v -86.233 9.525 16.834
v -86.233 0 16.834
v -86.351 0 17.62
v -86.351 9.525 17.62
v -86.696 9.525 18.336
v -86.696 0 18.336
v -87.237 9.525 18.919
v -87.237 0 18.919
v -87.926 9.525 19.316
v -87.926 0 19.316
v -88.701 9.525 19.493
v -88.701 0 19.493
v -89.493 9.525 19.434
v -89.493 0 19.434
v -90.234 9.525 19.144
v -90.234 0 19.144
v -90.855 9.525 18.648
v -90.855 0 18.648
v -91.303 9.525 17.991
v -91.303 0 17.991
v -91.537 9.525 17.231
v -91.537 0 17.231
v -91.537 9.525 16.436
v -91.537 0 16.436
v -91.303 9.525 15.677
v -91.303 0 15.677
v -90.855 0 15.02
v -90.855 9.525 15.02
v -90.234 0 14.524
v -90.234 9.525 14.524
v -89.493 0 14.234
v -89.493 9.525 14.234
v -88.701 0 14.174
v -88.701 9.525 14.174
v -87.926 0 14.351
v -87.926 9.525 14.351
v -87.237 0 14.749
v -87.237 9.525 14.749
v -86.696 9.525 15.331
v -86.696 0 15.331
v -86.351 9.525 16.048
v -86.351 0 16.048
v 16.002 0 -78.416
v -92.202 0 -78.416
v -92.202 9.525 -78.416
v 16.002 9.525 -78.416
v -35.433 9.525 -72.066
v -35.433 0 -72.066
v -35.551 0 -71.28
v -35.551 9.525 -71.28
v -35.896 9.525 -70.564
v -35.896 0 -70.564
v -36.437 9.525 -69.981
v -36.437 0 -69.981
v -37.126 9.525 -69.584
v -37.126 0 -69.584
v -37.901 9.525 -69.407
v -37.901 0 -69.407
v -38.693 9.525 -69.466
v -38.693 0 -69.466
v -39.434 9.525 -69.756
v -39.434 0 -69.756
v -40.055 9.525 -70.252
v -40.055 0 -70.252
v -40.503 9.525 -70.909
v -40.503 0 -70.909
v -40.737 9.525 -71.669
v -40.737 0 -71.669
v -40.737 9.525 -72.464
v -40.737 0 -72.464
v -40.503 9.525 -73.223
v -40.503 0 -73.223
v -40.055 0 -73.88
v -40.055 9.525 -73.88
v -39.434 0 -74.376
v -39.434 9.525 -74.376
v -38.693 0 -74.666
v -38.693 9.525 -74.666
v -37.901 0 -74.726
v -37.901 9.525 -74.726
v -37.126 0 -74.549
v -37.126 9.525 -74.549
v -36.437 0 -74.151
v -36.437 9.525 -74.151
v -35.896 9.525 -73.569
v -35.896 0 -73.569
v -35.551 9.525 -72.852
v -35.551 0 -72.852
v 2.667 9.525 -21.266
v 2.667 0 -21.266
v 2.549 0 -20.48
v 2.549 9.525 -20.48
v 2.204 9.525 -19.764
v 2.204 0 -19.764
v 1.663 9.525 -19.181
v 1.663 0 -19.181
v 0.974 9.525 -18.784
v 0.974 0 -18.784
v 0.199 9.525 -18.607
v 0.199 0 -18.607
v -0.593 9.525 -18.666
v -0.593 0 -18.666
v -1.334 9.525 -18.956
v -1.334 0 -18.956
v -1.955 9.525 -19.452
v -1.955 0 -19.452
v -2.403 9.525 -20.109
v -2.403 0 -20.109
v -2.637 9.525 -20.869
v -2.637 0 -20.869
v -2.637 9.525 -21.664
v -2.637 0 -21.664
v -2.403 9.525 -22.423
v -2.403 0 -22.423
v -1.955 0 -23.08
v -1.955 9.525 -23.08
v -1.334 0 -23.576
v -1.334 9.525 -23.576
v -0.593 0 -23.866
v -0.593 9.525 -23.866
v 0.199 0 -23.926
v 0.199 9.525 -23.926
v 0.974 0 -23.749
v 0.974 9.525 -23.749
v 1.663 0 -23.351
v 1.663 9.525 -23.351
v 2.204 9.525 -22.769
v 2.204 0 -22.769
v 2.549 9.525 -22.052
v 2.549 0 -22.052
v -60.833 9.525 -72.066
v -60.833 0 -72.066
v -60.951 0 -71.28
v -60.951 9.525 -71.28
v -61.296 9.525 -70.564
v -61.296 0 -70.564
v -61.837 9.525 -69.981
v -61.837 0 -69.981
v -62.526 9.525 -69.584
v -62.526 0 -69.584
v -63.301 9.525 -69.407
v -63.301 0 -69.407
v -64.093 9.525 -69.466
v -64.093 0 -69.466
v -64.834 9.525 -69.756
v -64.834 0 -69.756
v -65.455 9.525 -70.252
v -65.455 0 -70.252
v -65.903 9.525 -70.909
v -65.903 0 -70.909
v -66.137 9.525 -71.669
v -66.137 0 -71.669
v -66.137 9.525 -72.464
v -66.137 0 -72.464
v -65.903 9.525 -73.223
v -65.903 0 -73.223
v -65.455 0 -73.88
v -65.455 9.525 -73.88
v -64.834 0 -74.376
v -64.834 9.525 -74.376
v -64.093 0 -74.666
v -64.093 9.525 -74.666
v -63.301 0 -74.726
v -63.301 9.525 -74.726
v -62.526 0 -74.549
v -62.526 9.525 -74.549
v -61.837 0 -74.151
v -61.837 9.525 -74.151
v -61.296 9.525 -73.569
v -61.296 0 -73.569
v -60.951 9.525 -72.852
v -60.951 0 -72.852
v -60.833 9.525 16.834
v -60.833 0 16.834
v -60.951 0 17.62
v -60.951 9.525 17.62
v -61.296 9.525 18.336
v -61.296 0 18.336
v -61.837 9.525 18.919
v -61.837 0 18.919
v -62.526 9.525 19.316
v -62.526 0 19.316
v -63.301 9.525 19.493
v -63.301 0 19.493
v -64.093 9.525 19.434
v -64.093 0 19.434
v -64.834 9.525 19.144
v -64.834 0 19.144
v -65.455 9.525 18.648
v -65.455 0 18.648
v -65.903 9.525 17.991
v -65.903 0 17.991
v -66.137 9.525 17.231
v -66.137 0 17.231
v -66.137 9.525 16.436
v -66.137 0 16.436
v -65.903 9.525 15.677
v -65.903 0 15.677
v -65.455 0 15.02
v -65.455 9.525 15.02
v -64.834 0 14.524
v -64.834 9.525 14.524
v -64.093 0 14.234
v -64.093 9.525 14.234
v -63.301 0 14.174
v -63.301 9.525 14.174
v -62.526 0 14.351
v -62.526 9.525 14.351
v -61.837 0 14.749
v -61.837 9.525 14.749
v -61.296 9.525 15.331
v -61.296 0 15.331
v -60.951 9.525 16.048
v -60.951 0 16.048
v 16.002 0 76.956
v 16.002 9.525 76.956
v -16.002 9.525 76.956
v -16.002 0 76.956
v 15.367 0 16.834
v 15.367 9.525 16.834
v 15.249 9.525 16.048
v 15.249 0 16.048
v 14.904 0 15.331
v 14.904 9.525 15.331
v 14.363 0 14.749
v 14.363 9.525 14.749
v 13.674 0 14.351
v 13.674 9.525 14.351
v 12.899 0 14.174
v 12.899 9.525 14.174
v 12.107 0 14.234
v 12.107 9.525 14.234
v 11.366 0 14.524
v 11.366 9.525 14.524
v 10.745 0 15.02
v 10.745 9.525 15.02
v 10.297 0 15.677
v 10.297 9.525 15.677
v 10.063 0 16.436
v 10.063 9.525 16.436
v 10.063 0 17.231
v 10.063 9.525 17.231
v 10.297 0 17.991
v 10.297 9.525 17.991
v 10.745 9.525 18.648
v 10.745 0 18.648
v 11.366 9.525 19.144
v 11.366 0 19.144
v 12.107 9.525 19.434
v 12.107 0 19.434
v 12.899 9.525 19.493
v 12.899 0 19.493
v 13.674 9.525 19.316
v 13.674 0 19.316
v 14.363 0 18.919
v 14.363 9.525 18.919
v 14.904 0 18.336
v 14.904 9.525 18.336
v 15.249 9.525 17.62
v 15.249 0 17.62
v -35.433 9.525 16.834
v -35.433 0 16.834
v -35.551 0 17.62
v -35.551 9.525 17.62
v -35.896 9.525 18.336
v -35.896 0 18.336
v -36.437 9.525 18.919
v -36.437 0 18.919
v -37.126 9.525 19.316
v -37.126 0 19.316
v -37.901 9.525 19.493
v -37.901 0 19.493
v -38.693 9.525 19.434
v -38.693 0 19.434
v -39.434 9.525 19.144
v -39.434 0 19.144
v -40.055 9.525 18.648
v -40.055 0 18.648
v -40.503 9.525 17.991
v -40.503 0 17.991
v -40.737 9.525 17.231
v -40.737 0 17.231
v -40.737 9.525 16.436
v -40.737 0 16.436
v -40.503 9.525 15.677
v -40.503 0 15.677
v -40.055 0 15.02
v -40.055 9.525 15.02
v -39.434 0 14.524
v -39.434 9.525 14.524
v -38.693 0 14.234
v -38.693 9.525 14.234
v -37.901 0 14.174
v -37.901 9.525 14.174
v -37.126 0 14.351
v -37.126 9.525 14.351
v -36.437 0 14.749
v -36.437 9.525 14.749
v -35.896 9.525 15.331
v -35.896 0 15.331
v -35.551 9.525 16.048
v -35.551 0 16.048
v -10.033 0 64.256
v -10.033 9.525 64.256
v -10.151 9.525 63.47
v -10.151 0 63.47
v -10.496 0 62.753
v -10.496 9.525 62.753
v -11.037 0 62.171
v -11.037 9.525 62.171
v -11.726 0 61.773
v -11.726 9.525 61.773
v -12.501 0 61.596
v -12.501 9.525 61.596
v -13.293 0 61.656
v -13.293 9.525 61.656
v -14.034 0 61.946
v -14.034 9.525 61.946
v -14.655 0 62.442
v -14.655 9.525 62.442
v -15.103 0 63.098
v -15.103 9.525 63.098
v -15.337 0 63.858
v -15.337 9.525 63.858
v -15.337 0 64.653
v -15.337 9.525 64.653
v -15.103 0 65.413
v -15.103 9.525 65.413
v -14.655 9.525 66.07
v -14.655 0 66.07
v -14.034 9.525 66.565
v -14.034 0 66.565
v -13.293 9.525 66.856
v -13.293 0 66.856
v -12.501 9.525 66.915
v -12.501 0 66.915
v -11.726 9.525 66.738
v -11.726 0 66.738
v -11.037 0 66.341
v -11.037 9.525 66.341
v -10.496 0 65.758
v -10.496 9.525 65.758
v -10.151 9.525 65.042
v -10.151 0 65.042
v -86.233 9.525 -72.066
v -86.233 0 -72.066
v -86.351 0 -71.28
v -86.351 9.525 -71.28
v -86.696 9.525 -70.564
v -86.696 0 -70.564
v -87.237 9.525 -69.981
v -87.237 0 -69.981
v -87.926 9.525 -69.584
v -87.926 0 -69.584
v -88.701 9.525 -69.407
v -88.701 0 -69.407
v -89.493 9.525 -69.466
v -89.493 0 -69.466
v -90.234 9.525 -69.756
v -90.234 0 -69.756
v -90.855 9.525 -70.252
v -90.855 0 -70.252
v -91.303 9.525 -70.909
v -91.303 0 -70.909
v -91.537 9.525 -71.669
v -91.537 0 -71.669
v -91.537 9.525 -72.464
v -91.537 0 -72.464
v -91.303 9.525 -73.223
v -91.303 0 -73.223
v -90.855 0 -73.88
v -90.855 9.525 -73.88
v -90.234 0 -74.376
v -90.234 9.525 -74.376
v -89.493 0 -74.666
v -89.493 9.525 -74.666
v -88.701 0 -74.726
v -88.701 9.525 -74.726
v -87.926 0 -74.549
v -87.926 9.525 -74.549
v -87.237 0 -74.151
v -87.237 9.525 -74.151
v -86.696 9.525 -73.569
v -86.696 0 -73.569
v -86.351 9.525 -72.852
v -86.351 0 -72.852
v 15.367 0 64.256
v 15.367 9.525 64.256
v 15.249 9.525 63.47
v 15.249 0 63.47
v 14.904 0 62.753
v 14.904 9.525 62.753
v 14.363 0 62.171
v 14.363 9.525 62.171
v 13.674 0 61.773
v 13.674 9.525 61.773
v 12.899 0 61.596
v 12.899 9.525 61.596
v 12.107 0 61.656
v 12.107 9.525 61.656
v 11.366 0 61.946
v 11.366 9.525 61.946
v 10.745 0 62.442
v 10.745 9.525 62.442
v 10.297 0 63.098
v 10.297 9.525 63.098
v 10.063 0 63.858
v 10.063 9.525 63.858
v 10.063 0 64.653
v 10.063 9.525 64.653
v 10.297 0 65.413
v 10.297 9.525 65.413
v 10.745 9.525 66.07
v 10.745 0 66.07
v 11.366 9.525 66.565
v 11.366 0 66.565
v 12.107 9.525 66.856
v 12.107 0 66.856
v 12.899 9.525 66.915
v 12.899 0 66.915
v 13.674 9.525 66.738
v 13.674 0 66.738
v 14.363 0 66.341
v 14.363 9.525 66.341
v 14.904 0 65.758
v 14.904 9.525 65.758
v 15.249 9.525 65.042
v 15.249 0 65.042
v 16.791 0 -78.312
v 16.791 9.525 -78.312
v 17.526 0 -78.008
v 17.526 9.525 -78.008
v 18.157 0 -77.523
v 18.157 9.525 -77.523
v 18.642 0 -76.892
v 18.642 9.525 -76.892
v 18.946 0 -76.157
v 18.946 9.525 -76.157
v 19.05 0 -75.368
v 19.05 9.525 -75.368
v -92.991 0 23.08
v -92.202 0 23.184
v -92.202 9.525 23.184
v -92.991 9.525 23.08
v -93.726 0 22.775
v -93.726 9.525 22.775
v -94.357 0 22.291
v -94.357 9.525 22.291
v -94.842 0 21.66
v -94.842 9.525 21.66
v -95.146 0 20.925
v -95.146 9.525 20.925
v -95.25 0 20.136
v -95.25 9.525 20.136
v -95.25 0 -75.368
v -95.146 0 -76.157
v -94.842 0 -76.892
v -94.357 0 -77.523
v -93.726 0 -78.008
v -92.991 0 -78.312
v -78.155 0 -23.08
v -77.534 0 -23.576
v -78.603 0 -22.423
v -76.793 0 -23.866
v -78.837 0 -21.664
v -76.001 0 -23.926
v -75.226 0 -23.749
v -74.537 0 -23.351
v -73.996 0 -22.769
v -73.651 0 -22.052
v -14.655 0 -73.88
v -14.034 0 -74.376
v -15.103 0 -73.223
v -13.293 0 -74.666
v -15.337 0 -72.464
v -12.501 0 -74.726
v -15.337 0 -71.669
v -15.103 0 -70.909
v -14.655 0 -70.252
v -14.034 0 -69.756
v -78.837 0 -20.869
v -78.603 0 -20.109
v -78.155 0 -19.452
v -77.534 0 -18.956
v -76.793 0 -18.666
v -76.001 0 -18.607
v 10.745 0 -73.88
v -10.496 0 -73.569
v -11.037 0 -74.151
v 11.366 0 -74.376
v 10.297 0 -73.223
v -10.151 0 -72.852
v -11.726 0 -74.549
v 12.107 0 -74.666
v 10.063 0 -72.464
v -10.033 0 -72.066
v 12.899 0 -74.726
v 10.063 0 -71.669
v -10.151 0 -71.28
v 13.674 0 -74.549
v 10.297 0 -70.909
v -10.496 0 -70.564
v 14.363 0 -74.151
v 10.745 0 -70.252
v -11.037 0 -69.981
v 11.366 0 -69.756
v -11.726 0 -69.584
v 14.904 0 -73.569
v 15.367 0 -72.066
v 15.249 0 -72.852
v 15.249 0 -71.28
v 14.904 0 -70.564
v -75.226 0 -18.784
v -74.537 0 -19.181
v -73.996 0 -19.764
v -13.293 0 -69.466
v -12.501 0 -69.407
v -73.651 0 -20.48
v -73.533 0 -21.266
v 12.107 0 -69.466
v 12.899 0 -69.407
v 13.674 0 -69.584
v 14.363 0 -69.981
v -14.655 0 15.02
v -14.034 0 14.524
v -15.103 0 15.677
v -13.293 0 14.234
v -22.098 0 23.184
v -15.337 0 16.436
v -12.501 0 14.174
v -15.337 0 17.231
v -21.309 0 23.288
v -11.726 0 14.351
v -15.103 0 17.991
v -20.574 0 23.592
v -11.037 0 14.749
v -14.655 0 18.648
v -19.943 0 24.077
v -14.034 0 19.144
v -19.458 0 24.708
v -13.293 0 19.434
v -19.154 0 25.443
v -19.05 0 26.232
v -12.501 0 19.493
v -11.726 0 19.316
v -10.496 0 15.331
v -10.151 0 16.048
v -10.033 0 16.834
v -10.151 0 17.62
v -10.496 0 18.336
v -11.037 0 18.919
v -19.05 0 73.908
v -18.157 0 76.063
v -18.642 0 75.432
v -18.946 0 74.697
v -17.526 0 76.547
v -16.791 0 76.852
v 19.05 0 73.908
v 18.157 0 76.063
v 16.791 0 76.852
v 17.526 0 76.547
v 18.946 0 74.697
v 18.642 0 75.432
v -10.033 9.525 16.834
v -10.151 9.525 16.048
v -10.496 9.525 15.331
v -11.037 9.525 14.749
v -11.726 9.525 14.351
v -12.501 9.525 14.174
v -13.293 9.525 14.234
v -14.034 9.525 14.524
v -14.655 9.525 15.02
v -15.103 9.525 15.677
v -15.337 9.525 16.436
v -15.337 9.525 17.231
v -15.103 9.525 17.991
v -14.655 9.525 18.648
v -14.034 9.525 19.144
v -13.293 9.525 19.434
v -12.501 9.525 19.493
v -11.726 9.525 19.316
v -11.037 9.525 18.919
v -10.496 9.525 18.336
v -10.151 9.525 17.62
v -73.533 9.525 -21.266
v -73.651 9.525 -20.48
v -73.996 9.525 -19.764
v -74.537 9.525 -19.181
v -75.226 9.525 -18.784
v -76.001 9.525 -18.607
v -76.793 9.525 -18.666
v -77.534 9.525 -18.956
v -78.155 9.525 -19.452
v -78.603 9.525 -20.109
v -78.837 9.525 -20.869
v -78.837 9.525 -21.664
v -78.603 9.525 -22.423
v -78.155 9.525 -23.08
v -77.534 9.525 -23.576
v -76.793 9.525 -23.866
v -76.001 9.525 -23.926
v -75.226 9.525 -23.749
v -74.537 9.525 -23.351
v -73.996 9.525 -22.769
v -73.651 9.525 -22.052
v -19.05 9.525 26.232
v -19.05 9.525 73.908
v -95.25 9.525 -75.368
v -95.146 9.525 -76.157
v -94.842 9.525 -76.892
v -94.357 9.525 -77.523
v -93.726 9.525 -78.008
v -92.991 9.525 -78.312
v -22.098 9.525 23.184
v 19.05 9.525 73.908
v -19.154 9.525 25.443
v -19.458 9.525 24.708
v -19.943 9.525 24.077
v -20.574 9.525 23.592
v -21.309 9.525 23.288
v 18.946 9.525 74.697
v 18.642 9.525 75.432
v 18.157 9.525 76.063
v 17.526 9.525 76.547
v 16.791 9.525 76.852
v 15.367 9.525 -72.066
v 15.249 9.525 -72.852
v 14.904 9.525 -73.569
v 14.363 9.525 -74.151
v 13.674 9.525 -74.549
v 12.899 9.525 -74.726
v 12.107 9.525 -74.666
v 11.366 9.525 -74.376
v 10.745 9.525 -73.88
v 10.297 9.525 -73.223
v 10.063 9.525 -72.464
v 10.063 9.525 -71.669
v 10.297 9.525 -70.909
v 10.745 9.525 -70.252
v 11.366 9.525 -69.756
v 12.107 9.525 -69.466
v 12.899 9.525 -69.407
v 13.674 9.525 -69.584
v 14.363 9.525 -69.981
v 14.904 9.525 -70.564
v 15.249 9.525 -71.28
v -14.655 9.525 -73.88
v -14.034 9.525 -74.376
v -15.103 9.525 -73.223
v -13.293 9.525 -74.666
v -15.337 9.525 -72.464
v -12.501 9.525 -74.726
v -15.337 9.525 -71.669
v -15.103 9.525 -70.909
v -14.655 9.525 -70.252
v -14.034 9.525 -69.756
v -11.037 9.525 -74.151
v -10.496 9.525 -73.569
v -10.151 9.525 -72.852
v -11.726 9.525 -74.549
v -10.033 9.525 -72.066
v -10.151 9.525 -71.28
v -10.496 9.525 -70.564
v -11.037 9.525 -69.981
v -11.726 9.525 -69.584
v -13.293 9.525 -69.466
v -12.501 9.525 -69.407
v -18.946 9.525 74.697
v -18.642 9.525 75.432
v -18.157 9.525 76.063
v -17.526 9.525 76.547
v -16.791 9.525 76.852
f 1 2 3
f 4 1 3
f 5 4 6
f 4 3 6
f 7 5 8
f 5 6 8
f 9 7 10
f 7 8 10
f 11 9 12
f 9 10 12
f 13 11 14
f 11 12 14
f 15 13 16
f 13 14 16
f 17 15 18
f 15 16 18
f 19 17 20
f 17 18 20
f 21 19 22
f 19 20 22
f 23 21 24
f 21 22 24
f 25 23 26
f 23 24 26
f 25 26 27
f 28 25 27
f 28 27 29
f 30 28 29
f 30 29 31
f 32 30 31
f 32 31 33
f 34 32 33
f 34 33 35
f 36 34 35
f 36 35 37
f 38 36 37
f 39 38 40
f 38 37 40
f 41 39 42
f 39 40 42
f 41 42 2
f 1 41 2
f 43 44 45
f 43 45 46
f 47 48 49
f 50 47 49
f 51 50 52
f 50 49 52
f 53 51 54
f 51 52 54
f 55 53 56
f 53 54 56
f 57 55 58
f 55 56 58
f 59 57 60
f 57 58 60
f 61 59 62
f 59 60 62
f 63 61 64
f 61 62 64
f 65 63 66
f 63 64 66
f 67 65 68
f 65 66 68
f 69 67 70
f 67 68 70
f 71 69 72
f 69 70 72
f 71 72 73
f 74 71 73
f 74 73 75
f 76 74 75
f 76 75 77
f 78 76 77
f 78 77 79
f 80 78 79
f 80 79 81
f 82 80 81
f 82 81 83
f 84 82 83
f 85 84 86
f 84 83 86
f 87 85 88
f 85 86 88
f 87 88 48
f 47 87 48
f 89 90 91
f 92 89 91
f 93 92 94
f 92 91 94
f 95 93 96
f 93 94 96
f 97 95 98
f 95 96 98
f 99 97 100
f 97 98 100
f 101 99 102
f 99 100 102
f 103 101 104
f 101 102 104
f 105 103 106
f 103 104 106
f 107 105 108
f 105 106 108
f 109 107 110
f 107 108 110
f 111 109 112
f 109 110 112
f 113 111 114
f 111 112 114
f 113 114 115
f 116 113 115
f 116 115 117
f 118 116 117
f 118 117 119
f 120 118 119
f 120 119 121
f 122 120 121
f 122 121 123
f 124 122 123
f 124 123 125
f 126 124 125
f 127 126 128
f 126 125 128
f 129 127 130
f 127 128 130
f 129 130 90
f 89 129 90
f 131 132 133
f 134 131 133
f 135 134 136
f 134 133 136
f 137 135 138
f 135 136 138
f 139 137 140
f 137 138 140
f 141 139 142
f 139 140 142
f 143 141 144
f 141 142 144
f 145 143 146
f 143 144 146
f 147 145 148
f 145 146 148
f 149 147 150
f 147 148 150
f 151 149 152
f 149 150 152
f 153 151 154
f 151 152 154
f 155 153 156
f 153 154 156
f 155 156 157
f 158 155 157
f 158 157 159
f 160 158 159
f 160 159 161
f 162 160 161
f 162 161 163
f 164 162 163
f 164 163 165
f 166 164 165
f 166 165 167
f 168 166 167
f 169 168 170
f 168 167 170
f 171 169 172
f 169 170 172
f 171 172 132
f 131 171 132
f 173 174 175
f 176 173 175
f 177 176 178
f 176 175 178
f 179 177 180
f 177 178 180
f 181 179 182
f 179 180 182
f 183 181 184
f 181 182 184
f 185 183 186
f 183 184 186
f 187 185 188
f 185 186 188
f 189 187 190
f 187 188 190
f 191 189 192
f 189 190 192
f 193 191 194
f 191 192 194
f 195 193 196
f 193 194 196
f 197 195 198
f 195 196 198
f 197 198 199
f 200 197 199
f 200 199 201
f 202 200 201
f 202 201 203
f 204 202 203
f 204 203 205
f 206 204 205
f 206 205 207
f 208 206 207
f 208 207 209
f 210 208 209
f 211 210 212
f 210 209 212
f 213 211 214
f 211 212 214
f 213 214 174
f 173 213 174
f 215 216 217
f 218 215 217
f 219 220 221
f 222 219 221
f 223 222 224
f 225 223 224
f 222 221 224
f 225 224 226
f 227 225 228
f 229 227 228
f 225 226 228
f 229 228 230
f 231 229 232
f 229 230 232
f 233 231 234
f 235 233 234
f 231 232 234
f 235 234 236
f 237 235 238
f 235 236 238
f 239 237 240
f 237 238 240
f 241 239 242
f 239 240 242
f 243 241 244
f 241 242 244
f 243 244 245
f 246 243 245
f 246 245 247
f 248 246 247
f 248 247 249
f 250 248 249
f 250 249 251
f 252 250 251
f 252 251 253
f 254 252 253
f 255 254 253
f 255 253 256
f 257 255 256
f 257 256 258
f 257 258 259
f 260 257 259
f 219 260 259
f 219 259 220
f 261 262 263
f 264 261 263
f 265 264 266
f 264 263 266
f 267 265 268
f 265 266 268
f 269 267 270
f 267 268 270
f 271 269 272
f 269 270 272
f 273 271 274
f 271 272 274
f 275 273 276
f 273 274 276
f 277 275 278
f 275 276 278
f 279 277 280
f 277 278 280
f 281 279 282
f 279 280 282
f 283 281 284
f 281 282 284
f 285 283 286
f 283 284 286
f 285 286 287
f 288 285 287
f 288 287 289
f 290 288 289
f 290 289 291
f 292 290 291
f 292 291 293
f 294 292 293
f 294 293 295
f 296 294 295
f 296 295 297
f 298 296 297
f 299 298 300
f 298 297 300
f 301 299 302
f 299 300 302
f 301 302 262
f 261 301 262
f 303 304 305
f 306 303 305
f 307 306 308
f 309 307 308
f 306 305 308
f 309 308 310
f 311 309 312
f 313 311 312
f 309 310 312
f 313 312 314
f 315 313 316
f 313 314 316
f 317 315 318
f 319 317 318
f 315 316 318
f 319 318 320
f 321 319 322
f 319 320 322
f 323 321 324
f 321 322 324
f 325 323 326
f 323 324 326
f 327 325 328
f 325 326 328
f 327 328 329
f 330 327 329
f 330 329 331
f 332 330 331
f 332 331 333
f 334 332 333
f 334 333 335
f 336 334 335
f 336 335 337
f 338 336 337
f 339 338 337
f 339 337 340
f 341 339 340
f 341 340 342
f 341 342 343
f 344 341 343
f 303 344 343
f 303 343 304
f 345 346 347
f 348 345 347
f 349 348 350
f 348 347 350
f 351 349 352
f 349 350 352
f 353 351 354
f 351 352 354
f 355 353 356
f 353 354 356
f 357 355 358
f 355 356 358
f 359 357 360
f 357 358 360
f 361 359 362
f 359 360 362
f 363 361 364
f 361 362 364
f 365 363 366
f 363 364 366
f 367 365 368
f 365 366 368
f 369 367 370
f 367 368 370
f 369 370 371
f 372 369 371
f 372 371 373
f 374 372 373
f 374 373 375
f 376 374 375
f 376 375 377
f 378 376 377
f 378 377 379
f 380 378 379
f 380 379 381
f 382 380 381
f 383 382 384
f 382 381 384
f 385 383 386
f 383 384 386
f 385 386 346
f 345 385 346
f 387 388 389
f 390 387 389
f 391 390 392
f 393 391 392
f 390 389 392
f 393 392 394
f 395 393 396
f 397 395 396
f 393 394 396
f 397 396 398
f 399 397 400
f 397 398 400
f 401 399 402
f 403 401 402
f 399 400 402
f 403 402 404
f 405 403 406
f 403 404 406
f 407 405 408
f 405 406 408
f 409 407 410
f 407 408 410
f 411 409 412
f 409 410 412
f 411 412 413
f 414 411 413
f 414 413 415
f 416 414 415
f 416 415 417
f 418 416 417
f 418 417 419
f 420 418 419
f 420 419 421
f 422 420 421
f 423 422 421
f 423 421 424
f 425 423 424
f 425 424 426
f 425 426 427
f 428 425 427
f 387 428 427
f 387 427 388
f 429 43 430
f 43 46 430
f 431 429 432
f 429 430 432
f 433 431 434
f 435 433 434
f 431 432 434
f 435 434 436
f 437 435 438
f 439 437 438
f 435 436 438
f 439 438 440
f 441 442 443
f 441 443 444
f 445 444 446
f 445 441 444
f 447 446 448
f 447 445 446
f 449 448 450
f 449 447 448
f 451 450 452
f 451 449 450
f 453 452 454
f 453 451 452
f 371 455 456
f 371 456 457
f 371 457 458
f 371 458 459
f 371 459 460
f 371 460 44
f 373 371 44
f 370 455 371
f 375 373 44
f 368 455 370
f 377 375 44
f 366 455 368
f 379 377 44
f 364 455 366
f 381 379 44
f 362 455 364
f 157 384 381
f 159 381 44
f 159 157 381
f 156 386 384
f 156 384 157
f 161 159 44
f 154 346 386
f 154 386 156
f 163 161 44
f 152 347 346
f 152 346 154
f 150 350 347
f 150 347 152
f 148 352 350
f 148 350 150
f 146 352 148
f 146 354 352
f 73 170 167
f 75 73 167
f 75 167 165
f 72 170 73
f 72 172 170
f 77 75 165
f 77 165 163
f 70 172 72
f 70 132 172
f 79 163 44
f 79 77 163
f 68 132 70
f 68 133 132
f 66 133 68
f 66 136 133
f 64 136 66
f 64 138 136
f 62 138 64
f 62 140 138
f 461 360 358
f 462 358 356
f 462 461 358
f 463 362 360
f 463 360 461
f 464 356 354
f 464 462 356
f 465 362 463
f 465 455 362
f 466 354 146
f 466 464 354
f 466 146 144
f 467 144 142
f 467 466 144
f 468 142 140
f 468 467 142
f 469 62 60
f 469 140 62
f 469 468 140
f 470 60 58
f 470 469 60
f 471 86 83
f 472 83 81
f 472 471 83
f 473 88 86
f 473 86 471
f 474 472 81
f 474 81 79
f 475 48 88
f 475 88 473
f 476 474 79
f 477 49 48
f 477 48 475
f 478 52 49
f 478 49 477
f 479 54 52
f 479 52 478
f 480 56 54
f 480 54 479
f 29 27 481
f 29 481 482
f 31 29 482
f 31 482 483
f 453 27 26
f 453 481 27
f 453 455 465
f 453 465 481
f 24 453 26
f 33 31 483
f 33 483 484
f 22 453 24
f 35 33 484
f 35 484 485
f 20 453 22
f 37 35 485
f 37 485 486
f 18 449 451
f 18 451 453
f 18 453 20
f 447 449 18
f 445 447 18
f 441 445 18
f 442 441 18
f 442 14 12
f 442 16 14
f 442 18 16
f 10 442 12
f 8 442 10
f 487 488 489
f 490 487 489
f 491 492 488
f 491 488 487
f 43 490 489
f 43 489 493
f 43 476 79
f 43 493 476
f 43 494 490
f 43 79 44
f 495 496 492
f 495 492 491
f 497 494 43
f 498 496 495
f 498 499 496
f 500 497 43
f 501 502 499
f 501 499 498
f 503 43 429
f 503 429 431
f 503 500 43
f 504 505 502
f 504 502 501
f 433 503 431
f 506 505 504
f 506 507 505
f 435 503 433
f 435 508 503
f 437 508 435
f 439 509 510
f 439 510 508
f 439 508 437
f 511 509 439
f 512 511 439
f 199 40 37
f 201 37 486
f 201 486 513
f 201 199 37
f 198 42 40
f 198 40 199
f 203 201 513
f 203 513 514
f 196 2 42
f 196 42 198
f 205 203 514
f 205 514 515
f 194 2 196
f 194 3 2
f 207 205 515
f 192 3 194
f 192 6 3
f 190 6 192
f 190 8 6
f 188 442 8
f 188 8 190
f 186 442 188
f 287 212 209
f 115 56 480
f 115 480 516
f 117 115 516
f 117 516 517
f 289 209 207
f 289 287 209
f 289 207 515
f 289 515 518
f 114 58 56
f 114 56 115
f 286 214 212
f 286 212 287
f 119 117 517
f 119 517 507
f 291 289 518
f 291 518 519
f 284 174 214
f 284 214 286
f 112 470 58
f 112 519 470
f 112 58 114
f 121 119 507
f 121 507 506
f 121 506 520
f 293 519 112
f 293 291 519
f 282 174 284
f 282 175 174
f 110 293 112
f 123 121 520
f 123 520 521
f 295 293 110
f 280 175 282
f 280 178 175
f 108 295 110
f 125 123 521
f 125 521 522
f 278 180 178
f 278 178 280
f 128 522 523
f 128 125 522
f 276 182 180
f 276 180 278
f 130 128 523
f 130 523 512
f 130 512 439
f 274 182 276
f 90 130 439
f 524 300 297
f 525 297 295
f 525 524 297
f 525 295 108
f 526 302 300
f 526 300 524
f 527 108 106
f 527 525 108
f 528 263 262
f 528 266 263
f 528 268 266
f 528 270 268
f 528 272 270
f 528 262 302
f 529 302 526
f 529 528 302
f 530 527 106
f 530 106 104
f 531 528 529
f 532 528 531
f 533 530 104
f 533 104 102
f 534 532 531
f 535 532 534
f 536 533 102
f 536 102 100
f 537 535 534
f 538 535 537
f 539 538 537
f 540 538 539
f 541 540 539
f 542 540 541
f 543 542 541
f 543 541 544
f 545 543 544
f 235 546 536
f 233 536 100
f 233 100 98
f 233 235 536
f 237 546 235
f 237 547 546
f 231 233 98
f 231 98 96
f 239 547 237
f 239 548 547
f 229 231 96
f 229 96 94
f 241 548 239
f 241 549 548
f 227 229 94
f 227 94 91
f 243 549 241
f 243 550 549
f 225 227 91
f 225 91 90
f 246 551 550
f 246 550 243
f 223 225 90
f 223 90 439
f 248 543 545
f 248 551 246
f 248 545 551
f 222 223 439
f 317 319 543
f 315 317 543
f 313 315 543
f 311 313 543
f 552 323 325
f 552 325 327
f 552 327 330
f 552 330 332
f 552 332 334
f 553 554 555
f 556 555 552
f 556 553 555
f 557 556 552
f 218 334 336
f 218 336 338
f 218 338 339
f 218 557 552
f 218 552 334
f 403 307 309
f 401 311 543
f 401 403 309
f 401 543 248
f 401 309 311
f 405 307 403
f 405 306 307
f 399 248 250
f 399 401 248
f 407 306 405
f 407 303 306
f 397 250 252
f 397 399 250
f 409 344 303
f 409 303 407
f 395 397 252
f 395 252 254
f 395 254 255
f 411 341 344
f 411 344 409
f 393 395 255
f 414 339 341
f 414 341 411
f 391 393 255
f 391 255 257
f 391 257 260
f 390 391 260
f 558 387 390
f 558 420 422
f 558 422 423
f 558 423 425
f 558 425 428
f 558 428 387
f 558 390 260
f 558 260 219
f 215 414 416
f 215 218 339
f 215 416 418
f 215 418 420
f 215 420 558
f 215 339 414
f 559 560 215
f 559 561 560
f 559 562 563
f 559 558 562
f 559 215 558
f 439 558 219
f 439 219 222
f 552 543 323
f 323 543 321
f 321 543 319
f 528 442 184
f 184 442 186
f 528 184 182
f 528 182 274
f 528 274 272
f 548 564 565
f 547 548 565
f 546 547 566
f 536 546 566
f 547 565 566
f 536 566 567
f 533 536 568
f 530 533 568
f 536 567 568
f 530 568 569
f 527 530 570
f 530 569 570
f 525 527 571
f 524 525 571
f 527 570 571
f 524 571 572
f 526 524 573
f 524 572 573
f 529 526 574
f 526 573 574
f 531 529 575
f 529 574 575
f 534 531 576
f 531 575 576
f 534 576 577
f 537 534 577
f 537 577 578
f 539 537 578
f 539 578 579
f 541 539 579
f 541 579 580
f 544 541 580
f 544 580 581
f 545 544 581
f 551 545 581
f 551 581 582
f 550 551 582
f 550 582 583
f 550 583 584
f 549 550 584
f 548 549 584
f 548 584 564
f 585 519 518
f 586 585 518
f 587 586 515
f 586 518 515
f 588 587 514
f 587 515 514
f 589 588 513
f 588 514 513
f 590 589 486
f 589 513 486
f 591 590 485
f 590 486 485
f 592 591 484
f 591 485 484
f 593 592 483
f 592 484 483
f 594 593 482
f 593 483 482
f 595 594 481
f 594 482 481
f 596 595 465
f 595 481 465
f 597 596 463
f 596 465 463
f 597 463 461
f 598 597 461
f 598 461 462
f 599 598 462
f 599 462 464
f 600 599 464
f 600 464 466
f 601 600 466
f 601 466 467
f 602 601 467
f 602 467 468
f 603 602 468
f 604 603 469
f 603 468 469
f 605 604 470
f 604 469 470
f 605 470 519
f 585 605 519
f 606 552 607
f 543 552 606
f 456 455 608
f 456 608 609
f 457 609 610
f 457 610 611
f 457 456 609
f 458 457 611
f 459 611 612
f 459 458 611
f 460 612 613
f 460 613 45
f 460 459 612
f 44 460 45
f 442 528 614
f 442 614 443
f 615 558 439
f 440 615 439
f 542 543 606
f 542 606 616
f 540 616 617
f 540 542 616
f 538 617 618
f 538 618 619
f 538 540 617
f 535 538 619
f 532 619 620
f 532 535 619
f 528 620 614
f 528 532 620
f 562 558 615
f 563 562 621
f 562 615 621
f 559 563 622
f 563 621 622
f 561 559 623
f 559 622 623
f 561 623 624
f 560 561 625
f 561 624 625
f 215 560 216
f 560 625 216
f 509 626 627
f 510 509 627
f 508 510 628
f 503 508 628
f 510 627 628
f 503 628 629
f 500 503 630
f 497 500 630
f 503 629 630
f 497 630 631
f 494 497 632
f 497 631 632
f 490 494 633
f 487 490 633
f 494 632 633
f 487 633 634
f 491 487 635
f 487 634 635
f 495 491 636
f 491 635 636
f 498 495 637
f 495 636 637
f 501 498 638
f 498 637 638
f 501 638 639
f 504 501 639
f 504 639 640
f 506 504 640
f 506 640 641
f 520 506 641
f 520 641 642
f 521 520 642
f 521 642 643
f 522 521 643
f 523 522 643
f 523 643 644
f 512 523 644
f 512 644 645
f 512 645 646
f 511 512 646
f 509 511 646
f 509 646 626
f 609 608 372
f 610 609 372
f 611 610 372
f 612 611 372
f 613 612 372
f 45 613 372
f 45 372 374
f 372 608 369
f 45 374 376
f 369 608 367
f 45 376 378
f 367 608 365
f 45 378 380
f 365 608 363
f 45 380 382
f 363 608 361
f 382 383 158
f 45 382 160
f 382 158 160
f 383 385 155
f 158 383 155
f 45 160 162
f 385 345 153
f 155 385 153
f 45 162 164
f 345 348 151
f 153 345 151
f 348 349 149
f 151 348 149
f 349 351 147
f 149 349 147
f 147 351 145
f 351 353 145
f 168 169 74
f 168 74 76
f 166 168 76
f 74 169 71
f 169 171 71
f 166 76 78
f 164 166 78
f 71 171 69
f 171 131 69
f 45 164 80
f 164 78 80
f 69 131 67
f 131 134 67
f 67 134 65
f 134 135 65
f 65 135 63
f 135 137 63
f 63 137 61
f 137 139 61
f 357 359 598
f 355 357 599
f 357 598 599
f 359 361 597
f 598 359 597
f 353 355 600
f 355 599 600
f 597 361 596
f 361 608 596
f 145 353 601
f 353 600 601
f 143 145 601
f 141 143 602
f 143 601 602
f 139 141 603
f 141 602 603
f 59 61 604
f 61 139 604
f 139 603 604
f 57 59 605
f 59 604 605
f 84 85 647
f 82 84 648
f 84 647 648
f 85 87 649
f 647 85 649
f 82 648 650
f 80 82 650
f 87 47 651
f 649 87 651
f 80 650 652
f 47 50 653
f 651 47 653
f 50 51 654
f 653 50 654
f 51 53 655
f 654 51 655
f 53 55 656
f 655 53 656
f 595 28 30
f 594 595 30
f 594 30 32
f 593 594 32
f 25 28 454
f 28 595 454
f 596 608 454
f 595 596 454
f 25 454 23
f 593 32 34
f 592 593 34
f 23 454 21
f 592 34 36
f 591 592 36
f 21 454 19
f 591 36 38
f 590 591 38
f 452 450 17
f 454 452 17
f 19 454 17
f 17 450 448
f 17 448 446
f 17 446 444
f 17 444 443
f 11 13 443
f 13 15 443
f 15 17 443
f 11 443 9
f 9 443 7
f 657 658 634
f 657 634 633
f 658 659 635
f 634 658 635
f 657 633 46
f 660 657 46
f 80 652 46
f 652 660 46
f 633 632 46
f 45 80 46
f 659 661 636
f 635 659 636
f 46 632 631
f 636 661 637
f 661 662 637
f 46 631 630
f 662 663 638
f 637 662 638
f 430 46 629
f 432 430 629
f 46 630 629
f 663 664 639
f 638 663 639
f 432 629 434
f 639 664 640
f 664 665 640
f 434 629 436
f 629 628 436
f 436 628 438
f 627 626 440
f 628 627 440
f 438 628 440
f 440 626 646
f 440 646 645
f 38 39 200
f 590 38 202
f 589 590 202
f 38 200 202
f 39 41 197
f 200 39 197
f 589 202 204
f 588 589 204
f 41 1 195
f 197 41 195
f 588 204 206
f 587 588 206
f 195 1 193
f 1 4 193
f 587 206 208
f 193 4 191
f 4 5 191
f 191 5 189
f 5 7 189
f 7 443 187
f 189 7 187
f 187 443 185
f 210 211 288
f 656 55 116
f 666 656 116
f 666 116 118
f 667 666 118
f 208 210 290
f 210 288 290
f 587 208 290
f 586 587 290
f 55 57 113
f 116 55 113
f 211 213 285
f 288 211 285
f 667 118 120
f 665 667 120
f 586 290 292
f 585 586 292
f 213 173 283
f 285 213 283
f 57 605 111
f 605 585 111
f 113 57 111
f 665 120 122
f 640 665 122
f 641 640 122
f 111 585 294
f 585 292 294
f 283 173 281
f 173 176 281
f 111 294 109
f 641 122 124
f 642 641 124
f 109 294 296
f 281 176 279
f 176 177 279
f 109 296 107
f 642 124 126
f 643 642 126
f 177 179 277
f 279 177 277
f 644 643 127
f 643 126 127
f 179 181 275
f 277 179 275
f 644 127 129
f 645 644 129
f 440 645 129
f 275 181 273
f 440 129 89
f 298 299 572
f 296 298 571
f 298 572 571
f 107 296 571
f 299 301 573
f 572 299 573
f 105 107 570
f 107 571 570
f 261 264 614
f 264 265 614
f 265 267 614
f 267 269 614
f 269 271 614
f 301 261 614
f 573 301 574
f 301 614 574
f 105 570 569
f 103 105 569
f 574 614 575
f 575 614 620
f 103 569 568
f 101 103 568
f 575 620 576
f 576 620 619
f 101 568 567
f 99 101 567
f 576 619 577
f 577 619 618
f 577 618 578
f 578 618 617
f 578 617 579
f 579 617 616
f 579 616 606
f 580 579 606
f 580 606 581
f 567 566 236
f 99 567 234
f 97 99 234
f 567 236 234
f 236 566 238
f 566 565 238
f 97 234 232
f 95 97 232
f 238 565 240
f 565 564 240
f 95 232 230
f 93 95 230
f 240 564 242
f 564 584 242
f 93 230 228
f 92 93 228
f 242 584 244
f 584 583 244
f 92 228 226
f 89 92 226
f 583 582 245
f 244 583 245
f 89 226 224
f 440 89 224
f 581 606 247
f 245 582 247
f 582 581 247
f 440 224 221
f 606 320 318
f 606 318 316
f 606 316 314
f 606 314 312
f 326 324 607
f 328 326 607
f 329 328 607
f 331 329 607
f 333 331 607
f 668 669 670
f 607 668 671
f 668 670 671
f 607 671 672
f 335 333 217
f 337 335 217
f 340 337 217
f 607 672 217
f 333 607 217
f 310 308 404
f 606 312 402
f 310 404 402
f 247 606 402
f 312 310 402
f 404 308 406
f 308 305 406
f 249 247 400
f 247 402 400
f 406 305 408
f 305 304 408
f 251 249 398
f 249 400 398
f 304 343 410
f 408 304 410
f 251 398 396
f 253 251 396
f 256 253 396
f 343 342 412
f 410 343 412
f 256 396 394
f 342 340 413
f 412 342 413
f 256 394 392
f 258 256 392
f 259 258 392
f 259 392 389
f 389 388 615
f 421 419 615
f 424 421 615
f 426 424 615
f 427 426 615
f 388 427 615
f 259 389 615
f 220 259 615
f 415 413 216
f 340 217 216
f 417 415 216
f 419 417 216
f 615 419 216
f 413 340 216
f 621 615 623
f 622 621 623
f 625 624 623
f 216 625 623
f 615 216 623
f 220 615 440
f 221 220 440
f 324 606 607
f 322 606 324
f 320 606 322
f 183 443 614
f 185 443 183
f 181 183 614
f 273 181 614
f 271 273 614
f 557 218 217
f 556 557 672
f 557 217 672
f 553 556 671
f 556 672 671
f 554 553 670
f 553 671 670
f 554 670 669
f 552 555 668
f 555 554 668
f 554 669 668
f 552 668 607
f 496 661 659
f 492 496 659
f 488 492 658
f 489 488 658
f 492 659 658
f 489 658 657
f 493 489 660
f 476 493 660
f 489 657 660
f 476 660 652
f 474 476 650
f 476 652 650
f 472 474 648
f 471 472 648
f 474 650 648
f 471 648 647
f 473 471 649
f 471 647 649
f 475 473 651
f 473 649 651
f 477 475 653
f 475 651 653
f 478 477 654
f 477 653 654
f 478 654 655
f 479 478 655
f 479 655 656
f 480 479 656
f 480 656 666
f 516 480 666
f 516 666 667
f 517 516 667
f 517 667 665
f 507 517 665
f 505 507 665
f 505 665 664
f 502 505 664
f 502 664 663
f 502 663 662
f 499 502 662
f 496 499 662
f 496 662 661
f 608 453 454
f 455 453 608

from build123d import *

# Parameters (mm, degrees)
SKETCH1_W           = 38.1
SKETCH1_H           = 156.8323
BOSS_EXTRUDE1_DEPTH = 9.525
FILLET1_R           = 3.048
FILLET2_R           = 3.048
FILLET3_R           = 3.048
SKETCH2_R           = 2.667
CUT_EXTRUDE1_DEPTH  = 25.4
CUT_EXTRUDE2_DEPTH  = 29.718
SKETCH4_R           = 2.667
BOSS_EXTRUDE2_DEPTH = 9.525
SKETCH5_R           = 2.667
CUT_EXTRUDE3_DEPTH  = 9.525


with BuildPart() as part:
    # Sketch1 → Boss-Extrude1 (new body)
    with BuildSketch(Plane(origin=(0, 0, 0), x_dir=(1, 0, 0), z_dir=(0, 1, 0))):
        Rectangle(SKETCH1_W, SKETCH1_H)
    extrude(amount=BOSS_EXTRUDE1_DEPTH)

    # Fillet1
    fillet1_edges = [part.edges().sort_by_distance(p)[0] for p in [
        (19.05, 4.7625, 78.41615),
        (-19.05, 4.7625, 78.41615),
    ]]
    fillet(fillet1_edges, radius=FILLET1_R)

    # Fillet2
    fillet2_edges = [part.edges().sort_by_distance(p)[0] for p in [
        (-19.05, 4.7625, -78.41615),
    ]]
    fillet(fillet2_edges, radius=FILLET2_R)

    # Fillet3
    fillet3_edges = [part.edges().sort_by_distance(p)[0] for p in [
        (19.05, 4.7625, -78.41615),
    ]]
    fillet(fillet3_edges, radius=FILLET3_R)

    # Sketch2 → Cut-Extrude1 (cut)
    with BuildSketch(Plane(origin=(0, 9.525, 0), x_dir=(1, 0, 0), z_dir=(0, 1, 0))):
        with Locations((12.7, 72.06615)):
            Circle(SKETCH2_R)
        with Locations((12.7, -16.83385)):
            Circle(SKETCH2_R)
        with Locations((-12.7, -16.83385)):
            Circle(SKETCH2_R)
        with Locations((-12.7, 72.06615)):
            Circle(SKETCH2_R)
        with Locations((-12.7, -64.25565)):
            Circle(SKETCH2_R)
        with Locations((12.7, -64.25565)):
            Circle(SKETCH2_R)
    extrude(amount=-CUT_EXTRUDE1_DEPTH, mode=Mode.SUBTRACT)

    # Sketch3 → Cut-Extrude2 (cut)
    with BuildSketch(Plane(origin=(0, 9.525, 0), x_dir=(1, 0, 0), z_dir=(0, 1, 0))):
        with BuildLine():
            ThreePointArc((-16.002, -76.95565), (-18.157261469, -76.062911469), (-19.05, -73.90765))
            Line((-19.05, -73.90765), (-19.05, -75.36815))
            ThreePointArc((-19.05, -75.36815), (-18.936369601, -76.19263714), (-18.603950759, -76.95565))
            Line((-18.603950759, -76.95565), (-16.002, -76.95565))
        make_face()
        with BuildLine():
            Line((-12.7, -76.95565), (-16.002, -76.95565))
            Line((-16.002, -76.95565), (-18.603950759, -76.95565))
            ThreePointArc((-18.603950759, -76.95565), (-17.493912196, -78.026063091), (-16.002, -78.41615))
            Line((-16.002, -78.41615), (16.002, -78.41615))
            ThreePointArc((16.002, -78.41615), (17.493912196, -78.026063091), (18.603950759, -76.95565))
            Line((18.603950759, -76.95565), (16.002, -76.95565))
            Line((16.002, -76.95565), (-12.7, -76.95565))
        make_face()
        with BuildLine():
            ThreePointArc((19.05, -73.90765), (18.157261469, -76.062911469), (16.002, -76.95565))
            Line((16.002, -76.95565), (18.603950759, -76.95565))
            ThreePointArc((18.603950759, -76.95565), (18.936369601, -76.19263714), (19.05, -75.36815))
            Line((19.05, -75.36815), (19.05, -73.90765))
        make_face()
    extrude(amount=-CUT_EXTRUDE2_DEPTH, mode=Mode.SUBTRACT)

    # Sketch4 → Boss-Extrude2 (add)
    with BuildSketch(Plane.XZ):
        with BuildLine():
            Line((-92.202, -78.41615), (-16.002, -78.41615))
            ThreePointArc((-16.002, -78.41615), (-18.157261469, -77.523411469), (-19.05, -75.36815))
            Line((-19.05, -75.36815), (-19.05, 26.23185))
            ThreePointArc((-19.05, 26.23185), (-19.942738531, 24.076588531), (-22.098, 23.18385))
            Line((-22.098, 23.18385), (-92.202, 23.18385))
            ThreePointArc((-92.202, 23.18385), (-94.357261469, 22.291111469), (-95.25, 20.13585))
            Line((-95.25, 20.13585), (-95.25, -75.36815))
            ThreePointArc((-95.25, -75.36815), (-94.357261469, -77.523411469), (-92.202, -78.41615))
        make_face()
        with Locations((-88.9, -72.06615)):
            Circle(SKETCH4_R, mode=Mode.SUBTRACT)
        with Locations((-63.5, -72.06615)):
            Circle(SKETCH4_R, mode=Mode.SUBTRACT)
        with Locations((-38.1, -72.06615)):
            Circle(SKETCH4_R, mode=Mode.SUBTRACT)
        with Locations((-88.9, 16.83385)):
            Circle(SKETCH4_R, mode=Mode.SUBTRACT)
        with Locations((-63.5, 16.83385)):
            Circle(SKETCH4_R, mode=Mode.SUBTRACT)
        with Locations((-38.1, 16.83385)):
            Circle(SKETCH4_R, mode=Mode.SUBTRACT)
    extrude(amount=-BOSS_EXTRUDE2_DEPTH)

    # Sketch5 → Cut-Extrude3 (cut)
    with BuildSketch(Plane.XZ):
        with Locations((0, -21.26615)):
            Circle(SKETCH5_R)
        with Locations((-76.2, -21.26615)):
            Circle(SKETCH5_R)
    extrude(amount=-CUT_EXTRUDE3_DEPTH, mode=Mode.SUBTRACT)


solid = part.part
